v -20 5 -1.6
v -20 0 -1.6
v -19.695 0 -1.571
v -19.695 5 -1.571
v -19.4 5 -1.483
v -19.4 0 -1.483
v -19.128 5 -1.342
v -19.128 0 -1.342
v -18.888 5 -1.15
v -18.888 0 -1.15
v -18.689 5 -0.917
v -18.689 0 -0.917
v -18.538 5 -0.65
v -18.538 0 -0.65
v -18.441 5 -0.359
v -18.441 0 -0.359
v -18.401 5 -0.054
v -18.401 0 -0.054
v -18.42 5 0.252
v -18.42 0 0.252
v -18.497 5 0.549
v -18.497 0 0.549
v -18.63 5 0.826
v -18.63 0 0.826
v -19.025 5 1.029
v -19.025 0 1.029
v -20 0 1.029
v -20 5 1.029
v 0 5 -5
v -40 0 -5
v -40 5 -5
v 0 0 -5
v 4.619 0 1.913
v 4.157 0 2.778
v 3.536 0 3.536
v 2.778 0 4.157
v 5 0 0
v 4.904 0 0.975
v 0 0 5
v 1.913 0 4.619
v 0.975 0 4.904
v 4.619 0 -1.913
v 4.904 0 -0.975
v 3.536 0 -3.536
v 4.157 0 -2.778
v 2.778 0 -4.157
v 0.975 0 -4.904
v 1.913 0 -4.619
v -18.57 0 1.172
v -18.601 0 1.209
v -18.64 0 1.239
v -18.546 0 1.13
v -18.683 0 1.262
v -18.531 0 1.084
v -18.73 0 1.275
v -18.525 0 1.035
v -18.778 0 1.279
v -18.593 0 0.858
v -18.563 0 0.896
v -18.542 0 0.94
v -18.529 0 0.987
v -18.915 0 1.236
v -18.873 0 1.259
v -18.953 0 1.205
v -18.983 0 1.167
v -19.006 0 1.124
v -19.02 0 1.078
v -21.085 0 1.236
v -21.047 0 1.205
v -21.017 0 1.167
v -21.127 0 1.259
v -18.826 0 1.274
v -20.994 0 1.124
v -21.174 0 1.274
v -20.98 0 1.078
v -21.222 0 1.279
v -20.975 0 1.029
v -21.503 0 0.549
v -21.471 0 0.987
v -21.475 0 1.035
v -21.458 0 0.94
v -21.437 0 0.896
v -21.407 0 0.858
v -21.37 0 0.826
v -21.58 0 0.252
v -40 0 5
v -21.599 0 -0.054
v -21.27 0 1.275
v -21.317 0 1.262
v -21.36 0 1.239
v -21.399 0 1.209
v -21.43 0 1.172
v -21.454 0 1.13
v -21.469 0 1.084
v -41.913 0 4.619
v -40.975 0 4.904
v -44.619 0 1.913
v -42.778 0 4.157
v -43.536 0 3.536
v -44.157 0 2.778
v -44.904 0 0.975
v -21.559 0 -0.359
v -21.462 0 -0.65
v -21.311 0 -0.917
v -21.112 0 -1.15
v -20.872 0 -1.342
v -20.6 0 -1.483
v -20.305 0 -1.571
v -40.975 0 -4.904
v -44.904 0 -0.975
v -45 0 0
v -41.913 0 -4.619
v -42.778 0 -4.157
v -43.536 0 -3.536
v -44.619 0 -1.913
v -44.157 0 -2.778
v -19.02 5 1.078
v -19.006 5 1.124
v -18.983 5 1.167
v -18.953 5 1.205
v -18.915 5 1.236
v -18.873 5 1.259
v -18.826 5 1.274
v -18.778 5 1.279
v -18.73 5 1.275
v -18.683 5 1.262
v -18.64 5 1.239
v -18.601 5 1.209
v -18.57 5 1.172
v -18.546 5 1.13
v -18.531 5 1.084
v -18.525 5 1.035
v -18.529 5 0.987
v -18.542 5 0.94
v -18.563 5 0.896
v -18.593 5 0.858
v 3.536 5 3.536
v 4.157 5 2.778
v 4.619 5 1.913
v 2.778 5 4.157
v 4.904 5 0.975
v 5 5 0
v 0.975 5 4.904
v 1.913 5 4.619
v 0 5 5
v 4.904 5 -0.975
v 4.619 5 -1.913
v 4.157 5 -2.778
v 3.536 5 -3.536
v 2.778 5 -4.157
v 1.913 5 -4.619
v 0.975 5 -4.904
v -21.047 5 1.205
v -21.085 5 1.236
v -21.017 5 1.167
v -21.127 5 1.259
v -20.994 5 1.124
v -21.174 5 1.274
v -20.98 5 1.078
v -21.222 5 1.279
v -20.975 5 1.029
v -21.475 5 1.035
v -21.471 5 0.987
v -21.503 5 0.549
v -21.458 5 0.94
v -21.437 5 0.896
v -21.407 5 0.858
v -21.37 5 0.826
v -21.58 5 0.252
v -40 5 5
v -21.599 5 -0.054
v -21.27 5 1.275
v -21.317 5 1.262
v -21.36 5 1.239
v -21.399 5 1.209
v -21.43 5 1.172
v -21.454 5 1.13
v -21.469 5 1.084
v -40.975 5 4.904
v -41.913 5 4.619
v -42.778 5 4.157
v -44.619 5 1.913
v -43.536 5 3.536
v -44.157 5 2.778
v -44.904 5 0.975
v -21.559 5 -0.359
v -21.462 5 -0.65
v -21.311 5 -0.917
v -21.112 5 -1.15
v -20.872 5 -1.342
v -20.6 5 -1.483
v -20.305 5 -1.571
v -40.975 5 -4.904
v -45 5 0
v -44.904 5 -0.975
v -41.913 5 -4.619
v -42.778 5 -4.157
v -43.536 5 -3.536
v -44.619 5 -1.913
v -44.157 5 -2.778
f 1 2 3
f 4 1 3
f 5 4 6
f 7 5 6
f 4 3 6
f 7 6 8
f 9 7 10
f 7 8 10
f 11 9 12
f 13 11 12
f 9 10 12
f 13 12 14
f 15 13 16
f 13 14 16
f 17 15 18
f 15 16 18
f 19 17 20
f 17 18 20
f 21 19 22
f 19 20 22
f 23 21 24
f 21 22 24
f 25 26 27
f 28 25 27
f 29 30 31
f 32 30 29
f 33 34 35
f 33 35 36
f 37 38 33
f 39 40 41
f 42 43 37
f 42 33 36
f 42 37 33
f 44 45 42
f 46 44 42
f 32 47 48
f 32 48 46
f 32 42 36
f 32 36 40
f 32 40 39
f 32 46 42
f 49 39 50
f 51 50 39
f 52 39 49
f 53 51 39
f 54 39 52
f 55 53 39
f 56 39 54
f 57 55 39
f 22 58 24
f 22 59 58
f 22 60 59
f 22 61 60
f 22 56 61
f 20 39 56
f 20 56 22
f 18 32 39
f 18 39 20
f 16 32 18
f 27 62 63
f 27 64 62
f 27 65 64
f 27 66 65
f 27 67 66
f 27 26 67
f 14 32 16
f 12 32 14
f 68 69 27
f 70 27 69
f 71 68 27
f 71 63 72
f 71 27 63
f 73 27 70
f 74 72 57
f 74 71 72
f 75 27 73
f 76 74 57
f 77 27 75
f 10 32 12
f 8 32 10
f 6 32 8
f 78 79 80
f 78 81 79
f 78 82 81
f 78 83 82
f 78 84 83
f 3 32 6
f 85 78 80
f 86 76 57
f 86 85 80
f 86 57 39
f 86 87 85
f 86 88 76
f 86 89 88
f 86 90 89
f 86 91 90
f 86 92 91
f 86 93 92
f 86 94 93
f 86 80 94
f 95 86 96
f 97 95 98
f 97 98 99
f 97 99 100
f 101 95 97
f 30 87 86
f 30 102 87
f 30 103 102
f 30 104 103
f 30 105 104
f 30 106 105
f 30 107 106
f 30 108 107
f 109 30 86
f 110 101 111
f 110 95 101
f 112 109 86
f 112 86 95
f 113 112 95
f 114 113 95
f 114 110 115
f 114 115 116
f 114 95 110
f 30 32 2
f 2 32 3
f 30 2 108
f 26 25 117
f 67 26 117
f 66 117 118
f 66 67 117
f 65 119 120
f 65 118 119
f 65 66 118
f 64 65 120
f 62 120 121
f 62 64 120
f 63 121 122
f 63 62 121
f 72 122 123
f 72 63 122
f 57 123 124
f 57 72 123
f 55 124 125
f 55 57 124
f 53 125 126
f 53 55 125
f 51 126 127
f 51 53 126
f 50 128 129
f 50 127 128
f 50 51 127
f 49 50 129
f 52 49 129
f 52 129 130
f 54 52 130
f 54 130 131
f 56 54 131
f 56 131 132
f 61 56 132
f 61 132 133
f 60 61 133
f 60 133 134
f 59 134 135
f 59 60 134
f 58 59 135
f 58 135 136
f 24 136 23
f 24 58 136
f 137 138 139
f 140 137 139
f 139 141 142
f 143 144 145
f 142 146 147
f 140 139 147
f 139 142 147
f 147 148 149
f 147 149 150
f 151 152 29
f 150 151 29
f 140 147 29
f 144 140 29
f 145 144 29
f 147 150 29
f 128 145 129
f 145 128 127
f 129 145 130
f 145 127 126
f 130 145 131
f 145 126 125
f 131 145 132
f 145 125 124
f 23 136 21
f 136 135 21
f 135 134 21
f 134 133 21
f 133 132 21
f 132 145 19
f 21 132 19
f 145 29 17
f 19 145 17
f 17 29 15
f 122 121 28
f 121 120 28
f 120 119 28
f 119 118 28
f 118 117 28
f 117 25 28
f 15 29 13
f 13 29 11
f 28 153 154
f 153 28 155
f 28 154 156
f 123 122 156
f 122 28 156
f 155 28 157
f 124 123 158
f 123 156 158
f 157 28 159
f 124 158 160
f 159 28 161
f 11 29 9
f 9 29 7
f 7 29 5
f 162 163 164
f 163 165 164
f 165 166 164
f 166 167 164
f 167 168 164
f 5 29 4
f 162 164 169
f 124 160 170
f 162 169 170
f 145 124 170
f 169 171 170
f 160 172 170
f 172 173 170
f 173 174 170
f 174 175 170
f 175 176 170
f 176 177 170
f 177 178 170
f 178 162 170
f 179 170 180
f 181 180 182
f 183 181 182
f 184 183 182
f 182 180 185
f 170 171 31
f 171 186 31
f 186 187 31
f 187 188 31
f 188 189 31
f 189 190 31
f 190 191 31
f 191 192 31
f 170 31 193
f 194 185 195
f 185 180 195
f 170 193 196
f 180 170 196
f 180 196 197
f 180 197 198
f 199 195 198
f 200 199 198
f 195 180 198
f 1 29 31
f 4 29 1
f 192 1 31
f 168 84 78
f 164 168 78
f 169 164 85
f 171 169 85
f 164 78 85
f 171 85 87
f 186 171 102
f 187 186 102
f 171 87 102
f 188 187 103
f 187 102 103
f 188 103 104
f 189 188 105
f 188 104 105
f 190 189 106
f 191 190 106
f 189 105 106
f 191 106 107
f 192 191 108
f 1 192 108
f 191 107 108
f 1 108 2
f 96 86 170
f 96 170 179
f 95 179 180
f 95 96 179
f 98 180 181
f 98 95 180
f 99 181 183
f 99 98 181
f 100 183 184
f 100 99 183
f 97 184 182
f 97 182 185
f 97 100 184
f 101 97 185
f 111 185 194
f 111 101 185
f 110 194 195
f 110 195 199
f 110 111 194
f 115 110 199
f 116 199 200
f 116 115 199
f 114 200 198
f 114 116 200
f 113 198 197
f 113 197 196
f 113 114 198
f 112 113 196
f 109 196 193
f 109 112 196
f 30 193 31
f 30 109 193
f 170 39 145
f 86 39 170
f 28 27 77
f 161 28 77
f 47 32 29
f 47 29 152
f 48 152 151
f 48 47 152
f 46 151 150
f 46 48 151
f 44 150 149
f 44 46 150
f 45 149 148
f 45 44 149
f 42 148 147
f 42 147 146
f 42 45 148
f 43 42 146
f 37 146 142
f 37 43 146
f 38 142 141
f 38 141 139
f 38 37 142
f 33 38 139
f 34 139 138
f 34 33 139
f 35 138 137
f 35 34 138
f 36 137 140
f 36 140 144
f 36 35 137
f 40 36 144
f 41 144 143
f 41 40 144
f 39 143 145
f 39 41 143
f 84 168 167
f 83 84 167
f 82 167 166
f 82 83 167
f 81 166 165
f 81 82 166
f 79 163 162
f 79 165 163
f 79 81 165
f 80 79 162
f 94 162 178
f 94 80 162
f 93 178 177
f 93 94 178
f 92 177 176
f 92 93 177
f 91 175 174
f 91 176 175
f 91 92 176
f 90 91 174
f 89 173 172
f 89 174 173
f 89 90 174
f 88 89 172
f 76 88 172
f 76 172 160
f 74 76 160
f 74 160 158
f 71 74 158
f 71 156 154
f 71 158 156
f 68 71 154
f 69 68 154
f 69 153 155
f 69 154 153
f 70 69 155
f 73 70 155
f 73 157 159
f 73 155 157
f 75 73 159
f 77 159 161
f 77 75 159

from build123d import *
from build123d.topology import SkipClean

# Parameters (mm, degrees)
BOSS_EXTRUDE1_DEPTH     = 5
CUT_EXTRUDE1_DEPTH      = 46.552167896
CUT_EXTRUDE1_DEPTH_BACK = 46.552167896
SKETCH2_R               = 0.25


with BuildPart() as part:
    # Sketch1 → Boss-Extrude1 (new body)
    with BuildSketch(Plane(origin=(0, 0, 0), x_dir=(1, 0, 0), z_dir=(0, 1, 0))):
        with BuildLine():
            Line((-40, 5), (0, 5))
            ThreePointArc((0, 5), (5, 0), (0, -5))
            Line((0, -5), (-40, -5))
            ThreePointArc((-40, -5), (-45, 0), (-40, 5))
        make_face()
    extrude(amount=BOSS_EXTRUDE1_DEPTH)

    # Sketch2 → Cut-Extrude1 (cut, two sides: drawn at the far end of the back side and taken through both)
    with SkipClean():  # the faces are left unmerged after this step: merging them gives an invalid solid
        with BuildSketch(Plane(origin=(0, 5, 0), x_dir=(1, 0, 0), z_dir=(0, 1, 0)).offset(-CUT_EXTRUDE1_DEPTH_BACK)):
            with Locations((-18.775, -1.029259443)):
                Circle(SKETCH2_R)
            with BuildLine():
                Line((-18.775, -1.029259443), (-21.225, -1.029259443))
                ThreePointArc((-21.225, -1.029259443), (-20, 1.6), (-18.775, -1.029259443))
            make_face()
            with BuildLine():
                ThreePointArc((-18.775, -1.029259443), (-20, 1.6), (-21.225, -1.029259443))
                Line((-21.225, -1.029259443), (-18.775, -1.029259443))
            make_face()
            with BuildLine():
                ThreePointArc((-18.629623366, -0.82587401), (-18.606910194, 0.786956665), (-20, 1.6))
                Line((-20, 1.6), (-20, -1.029259443))
                Line((-20, -1.029259443), (-19.025, -1.029259443))
                ThreePointArc((-19.025, -1.029259443), (-18.889358737, -0.806948671), (-18.629623366, -0.82587401))
            make_face()
            with BuildLine():
                Line((-20, -1.029259443), (-20, 1.6))
                ThreePointArc((-20, 1.6), (-21.393089806, 0.786956665), (-21.370376634, -0.82587401))
                ThreePointArc((-21.370376634, -0.82587401), (-21.110641263, -0.806948671), (-20.975, -1.029259443))
                Line((-20.975, -1.029259443), (-20, -1.029259443))
            make_face()
            with Locations((-21.225, -1.029259443)):
                Circle(SKETCH2_R)
        extrude(amount=CUT_EXTRUDE1_DEPTH + CUT_EXTRUDE1_DEPTH_BACK, mode=Mode.SUBTRACT)


solid = part.part
